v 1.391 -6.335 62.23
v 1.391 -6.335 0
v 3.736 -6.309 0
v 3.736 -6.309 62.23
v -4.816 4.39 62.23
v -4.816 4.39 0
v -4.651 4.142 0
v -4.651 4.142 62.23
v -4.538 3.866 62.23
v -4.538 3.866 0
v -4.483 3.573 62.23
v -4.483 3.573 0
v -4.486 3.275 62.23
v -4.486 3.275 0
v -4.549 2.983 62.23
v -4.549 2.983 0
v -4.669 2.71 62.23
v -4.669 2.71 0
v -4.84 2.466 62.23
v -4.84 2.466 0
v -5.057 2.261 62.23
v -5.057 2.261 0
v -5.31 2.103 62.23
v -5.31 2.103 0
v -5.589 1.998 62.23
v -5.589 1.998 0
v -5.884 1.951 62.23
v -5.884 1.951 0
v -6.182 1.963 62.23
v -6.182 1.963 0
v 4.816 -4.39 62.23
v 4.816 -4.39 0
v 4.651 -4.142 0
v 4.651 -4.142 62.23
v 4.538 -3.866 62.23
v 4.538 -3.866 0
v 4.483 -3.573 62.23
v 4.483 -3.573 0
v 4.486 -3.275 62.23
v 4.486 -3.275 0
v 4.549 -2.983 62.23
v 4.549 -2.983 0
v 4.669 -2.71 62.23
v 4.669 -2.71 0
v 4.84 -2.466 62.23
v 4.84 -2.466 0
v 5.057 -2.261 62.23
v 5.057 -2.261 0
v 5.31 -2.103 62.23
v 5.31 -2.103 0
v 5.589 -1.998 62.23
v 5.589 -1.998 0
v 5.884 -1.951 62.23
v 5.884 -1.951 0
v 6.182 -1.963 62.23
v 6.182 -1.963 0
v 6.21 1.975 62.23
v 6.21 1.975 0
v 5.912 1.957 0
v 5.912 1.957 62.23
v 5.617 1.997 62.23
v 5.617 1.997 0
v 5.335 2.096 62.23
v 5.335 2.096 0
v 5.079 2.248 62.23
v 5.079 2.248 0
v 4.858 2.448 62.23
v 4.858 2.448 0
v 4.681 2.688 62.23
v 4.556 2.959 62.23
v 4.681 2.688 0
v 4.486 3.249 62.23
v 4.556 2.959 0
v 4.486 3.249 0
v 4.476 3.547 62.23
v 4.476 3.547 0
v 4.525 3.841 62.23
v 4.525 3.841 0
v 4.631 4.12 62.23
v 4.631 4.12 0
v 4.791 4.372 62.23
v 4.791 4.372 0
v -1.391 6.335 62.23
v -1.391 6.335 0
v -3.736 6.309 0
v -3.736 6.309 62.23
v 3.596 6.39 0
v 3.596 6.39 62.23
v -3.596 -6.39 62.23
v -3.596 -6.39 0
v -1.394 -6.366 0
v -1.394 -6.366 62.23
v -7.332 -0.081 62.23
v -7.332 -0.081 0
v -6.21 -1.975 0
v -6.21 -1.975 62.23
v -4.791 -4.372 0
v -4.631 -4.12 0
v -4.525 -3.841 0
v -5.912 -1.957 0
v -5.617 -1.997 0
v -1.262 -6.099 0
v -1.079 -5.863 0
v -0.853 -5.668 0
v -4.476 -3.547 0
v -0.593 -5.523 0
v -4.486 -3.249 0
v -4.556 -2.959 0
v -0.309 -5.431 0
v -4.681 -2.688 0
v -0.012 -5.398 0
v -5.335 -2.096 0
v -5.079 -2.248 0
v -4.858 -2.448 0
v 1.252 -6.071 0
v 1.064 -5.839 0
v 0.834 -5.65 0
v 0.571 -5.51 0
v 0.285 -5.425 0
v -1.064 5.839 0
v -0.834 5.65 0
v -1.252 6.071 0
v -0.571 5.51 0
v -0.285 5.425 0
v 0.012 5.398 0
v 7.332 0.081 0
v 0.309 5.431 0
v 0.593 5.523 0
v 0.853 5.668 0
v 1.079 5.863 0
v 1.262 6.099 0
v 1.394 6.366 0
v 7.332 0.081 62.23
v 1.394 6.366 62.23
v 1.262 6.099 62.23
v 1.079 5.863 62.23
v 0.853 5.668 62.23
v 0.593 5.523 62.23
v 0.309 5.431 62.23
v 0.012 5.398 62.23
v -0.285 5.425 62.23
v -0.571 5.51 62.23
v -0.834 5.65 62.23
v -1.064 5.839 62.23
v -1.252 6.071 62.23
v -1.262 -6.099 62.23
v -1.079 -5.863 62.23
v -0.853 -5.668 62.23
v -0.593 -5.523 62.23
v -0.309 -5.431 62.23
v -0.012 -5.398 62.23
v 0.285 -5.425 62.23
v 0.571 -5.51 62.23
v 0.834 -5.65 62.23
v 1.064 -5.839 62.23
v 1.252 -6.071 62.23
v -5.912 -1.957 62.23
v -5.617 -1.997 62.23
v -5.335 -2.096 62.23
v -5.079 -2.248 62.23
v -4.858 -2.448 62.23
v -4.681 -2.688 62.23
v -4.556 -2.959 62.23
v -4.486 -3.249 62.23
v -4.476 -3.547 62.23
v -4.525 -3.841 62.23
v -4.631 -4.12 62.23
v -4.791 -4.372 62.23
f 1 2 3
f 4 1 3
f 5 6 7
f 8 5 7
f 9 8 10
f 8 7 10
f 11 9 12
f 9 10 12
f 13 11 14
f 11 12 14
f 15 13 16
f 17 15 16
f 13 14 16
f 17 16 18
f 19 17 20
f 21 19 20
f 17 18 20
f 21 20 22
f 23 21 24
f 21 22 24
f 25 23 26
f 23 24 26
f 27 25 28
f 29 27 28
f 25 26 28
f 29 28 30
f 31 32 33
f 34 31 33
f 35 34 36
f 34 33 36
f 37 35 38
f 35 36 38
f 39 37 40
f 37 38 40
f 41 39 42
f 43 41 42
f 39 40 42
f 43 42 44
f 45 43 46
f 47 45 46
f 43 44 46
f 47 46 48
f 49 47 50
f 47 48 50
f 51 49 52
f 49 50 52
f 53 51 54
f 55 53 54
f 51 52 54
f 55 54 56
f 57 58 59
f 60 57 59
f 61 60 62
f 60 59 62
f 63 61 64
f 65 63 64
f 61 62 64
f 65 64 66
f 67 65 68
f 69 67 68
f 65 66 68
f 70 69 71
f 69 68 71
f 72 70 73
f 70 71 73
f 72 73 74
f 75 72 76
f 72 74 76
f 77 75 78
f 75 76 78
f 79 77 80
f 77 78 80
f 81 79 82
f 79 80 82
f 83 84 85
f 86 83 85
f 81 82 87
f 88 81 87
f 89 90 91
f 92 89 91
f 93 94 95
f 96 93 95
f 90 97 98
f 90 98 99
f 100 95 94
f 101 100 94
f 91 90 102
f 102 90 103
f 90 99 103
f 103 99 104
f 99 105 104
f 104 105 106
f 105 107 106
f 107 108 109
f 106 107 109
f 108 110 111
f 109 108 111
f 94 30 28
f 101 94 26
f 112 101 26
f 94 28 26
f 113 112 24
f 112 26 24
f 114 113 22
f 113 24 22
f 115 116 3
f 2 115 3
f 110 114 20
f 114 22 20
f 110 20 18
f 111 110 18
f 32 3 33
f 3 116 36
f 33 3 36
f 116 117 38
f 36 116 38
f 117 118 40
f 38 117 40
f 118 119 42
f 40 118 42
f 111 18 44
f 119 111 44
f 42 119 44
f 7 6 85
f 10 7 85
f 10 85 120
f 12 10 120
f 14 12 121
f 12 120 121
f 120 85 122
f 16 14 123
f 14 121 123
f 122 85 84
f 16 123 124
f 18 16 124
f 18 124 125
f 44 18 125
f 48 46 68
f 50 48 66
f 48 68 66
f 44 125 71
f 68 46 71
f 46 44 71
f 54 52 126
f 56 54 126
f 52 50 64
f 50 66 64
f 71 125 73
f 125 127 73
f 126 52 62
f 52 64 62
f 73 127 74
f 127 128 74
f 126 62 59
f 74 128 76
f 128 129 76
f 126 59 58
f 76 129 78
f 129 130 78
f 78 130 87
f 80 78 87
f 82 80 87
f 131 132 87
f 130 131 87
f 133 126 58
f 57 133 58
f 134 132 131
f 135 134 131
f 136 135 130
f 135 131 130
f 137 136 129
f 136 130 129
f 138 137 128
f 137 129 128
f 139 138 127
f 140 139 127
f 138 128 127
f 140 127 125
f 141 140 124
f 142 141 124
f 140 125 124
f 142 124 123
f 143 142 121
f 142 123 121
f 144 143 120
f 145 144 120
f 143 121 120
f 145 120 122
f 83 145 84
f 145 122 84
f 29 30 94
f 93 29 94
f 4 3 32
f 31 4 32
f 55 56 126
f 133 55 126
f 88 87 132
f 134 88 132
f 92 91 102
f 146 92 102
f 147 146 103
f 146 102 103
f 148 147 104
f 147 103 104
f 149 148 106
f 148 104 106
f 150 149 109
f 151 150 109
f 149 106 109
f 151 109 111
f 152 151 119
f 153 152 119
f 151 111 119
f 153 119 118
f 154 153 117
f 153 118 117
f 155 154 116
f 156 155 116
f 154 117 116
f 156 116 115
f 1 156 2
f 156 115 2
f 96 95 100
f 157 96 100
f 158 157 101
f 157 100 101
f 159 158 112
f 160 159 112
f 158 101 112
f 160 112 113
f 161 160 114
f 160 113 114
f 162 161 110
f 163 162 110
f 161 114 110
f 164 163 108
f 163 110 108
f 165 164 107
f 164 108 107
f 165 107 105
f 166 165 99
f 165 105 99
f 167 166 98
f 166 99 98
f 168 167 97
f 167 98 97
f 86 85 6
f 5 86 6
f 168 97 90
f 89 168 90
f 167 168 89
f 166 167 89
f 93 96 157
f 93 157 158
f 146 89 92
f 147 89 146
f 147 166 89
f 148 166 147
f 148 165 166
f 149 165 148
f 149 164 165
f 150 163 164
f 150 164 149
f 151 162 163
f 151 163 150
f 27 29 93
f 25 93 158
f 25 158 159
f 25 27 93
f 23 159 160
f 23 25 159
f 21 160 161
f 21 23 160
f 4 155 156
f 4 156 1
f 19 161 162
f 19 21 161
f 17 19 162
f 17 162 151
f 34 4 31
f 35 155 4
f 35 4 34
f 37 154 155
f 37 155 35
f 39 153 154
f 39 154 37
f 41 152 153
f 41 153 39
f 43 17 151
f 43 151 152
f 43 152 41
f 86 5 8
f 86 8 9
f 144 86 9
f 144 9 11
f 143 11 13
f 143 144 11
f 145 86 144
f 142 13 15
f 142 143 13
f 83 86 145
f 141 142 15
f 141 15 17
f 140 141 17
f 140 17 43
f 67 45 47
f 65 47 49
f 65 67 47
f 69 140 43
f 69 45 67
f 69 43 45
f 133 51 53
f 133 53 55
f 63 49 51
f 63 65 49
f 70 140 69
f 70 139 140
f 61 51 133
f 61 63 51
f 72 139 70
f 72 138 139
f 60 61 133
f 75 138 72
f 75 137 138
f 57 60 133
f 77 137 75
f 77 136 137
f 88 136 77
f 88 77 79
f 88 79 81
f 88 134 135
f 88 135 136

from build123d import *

# Parameters (mm, degrees)
F1_DEPTH = 62.23
F3_DEPTH = 62.23
F4_DEPTH = 10.795
F5_DEPTH = 10.795


with BuildPart() as f1:
    # F0 (on Top) → F1 (new body)
    with BuildSketch(Plane.XY):
        Polygon((-7.3319007784, -0.081020421), (-3.5957846464, -6.3901225426), (3.736116132, -6.3091021217), (7.3319007784, 0.081020421), (3.5957846464, 6.3901225426), (-3.736116132, 6.3091021217), align=None)
    extrude(amount=F1_DEPTH)

    # F2 (on face) → F3 (cut, through all)
    with BuildSketch(Plane(origin=(0, 0, 0), x_dir=(1, 0, 0), z_dir=(0, 0, -1))):
        with BuildLine():
            ThreePointArc((-6.2100646879, 1.9754418492), (-4.6811988128, 2.6884458628), (-4.7909795689, 4.3718215705))
            Line((-4.7909795689, 4.3718215705), (-6.2100646879, 1.9754418492))
        make_face()
        with BuildLine():
            Line((1.3906187564, 6.3350208009), (-1.3942495189, 6.3657947035))
            ThreePointArc((-1.3942495189, 6.3657947035), (-0.0123369925, 5.3982600234), (1.3906187564, 6.3350208009))
        make_face()
        with BuildLine():
            Line((6.1815983253, 1.9631992305), (4.815815169, 4.3903528543))
            ThreePointArc((4.815815169, 4.3903528543), (4.6688618202, 2.7098141606), (6.1815983253, 1.9631992305))
        make_face()
        with BuildLine():
            Line((4.7909795689, -4.3718215705), (6.2100646879, -1.9754418492))
            ThreePointArc((6.2100646879, -1.9754418492), (4.6811988128, -2.6884458628), (4.7909795689, -4.3718215705))
        make_face()
        with BuildLine():
            ThreePointArc((1.3942495189, -6.3657947035), (0.0123369925, -5.3982600234), (-1.3906187564, -6.3350208009))
            Line((-1.3906187564, -6.3350208009), (1.3942495189, -6.3657947035))
        make_face()
        with BuildLine():
            ThreePointArc((-4.815815169, -4.3903528543), (-4.6688618202, -2.7098141606), (-6.1815983253, -1.9631992305))
            Line((-6.1815983253, -1.9631992305), (-4.815815169, -4.3903528543))
        make_face()
    extrude(amount=-F3_DEPTH, mode=Mode.SUBTRACT)

    # F4 (add): a face of the model
    f4_faces = [f1.faces().sort_by_distance(p)[0] for p in [
        (0, 0, 62.23),
    ]]
    extrude(f4_faces, amount=F4_DEPTH)

    # F5 (cut): a face of the model
    f5_faces = [f1.faces().sort_by_distance(p)[0] for p in [
        (0, 0, 73.025),
    ]]
    extrude(f5_faces, amount=-F5_DEPTH, mode=Mode.SUBTRACT)


solid = f1.part
